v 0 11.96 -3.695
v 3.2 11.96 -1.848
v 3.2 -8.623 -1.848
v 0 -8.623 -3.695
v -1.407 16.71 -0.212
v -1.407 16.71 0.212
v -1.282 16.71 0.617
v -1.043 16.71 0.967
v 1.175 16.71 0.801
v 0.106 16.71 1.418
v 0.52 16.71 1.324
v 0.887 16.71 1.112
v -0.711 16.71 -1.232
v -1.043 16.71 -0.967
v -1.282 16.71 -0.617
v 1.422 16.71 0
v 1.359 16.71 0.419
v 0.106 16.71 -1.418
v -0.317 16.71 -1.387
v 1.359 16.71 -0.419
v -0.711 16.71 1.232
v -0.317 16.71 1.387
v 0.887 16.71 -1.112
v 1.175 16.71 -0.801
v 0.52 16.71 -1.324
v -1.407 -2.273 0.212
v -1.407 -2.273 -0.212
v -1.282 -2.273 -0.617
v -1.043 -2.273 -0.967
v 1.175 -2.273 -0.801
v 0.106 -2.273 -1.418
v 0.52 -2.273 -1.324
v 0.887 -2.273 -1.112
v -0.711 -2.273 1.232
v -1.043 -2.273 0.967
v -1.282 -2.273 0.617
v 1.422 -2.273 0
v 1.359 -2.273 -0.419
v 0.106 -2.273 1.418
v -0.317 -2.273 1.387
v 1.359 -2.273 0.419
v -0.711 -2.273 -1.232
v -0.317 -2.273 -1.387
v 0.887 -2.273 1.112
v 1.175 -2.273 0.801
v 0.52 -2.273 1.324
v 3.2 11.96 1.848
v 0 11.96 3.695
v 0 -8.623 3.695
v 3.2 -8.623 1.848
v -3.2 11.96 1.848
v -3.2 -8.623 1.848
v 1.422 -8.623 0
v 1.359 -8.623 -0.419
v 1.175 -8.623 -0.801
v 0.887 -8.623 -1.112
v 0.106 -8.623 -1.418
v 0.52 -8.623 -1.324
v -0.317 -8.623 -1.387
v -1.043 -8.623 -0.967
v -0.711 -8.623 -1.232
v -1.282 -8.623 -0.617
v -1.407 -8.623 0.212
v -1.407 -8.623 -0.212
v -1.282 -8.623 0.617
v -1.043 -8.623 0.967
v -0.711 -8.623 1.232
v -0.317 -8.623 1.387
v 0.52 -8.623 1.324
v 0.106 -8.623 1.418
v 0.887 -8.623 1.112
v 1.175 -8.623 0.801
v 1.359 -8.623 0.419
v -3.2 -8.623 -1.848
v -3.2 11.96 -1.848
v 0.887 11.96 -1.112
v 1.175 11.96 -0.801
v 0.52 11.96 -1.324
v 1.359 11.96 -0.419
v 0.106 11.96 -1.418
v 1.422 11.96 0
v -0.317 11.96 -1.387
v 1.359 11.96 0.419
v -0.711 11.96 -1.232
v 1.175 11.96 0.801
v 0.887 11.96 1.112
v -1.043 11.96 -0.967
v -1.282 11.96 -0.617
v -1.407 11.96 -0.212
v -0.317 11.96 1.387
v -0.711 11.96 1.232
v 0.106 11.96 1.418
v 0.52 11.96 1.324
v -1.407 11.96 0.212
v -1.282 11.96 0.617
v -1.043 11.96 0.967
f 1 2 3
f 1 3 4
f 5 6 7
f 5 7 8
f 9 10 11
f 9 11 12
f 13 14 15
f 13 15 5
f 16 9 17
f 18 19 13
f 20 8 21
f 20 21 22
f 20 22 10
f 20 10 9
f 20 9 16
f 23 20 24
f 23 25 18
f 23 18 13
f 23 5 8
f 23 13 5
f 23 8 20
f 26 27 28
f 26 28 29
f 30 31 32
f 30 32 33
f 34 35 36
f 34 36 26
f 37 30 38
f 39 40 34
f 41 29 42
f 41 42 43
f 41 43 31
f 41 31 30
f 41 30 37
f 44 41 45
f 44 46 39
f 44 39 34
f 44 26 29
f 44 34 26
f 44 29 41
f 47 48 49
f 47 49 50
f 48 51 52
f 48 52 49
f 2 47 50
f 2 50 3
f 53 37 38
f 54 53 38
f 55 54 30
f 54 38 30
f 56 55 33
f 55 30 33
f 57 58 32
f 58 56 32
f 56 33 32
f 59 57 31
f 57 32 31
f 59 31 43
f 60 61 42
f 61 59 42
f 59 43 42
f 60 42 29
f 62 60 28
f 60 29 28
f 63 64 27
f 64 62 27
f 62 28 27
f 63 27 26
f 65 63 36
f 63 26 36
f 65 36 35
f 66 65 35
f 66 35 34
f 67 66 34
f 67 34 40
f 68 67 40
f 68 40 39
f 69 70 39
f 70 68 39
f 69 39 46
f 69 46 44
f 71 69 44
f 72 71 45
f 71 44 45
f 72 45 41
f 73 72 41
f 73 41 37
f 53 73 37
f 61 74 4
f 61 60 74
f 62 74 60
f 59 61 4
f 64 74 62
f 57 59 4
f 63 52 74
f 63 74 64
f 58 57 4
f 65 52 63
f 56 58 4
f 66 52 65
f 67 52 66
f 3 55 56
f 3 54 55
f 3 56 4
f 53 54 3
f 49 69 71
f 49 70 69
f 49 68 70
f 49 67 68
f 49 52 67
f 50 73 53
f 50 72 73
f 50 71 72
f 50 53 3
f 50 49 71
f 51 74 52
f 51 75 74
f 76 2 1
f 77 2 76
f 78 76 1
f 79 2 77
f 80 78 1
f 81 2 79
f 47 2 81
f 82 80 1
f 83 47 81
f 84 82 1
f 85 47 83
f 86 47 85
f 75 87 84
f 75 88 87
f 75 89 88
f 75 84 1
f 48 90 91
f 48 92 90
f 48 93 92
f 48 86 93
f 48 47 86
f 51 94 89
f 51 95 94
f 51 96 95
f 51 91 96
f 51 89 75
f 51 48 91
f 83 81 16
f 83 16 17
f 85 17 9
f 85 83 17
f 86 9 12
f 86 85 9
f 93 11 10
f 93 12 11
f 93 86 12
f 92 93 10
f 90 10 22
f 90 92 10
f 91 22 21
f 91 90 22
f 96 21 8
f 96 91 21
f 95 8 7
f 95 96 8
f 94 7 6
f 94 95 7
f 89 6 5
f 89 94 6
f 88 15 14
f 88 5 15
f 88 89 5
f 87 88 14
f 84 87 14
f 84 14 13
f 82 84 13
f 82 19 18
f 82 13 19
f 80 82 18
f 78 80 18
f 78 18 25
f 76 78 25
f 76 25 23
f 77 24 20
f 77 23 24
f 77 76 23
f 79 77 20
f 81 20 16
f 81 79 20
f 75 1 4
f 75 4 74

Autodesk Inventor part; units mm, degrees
ref_plane "YZ Plane" through (0, 0, 0) normal (1, 0, 0) x (0, 1, 0)
ref_plane "XZ Plane" through (0, 0, 0) normal (0, 1, 0) x (-1, 0, 0)
ref_plane "XY Plane" through (0, 0, 0) normal (0, 0, 1) x (1, 0, 0)
sketch "Sketch1" plane through (0, 0, 0) normal (0, 1, 0) x (-1, 0, 0)
  line L0 (3.2, 1.8475) -> (3.2, -1.8475)
  line L1 (3.2, -1.8475) -> (0, -3.695)
  line L2 (0, -3.695) -> (-3.2, -1.8475)
  line L3 (-3.2, -1.8475) -> (-3.2, 1.8475)
  line L4 (-3.2, 1.8475) -> (0, 3.695)
  line L5 (0, 3.695) -> (3.2, 1.8475)
  point P0 (0, 0)
  point P1 (3.2, 0)
  point P2 (-3.2, 0)
  dimension "d0" = 6.4
  dimension "d1" = 120
  dimension "d2" = 6.4
extrude "Extrusion1" add sketch "Sketch1" along normal blind 11.96
sketch "Sketch2" plane through (0, 11.96, 0) normal (0, 1, 0) x (1, 0, 0)
  circle A0 centre (0, 0) radius 1.4224
  dimension "d5" = 2.8448
extrude "Extrusion2" add sketch "Sketch2" along normal blind 4.75
sketch "Sketch3" plane through (0, 0, 0) normal (0, -1, 0) x (1, 0, 0)
  circle A0 centre (0, 0) radius 1.4224
  dimension "d8" = 2.8448
extrude "Extrusion3" cut sketch "Sketch3" against normal blind 6.35
sketch "Sketch4" plane through (0, 0, 0) normal (0, -1, 0) x (1, 0, 0)
  circle A0 centre (0, 0) radius 1.4224 projected
  line L0 (-3.2, -1.8475) -> (-3.2, 1.8475) projected
  line L1 (0, -3.695) -> (-3.2, -1.8475) projected
  line L2 (3.2, -1.8475) -> (0, -3.695) projected
  line L3 (3.2, 1.8475) -> (3.2, -1.8475) projected
  line L4 (0, 3.695) -> (3.2, 1.8475) projected
  line L5 (-3.2, 1.8475) -> (0, 3.695) projected
extrude "Extrusion4" add sketch "Sketch4" along normal blind 8.6233
sketch "Sketch5" plane through (0, 6.35, 0) normal (0, -1, 0) x (1, 0, 0)
  circle A0 centre (0, 0) radius 1.4224 projected
extrude "Extrusion5" add sketch "Sketch5" along normal blind 8.6233
properties part number "pc104standoffTEMP" material "Stainless Steel"
